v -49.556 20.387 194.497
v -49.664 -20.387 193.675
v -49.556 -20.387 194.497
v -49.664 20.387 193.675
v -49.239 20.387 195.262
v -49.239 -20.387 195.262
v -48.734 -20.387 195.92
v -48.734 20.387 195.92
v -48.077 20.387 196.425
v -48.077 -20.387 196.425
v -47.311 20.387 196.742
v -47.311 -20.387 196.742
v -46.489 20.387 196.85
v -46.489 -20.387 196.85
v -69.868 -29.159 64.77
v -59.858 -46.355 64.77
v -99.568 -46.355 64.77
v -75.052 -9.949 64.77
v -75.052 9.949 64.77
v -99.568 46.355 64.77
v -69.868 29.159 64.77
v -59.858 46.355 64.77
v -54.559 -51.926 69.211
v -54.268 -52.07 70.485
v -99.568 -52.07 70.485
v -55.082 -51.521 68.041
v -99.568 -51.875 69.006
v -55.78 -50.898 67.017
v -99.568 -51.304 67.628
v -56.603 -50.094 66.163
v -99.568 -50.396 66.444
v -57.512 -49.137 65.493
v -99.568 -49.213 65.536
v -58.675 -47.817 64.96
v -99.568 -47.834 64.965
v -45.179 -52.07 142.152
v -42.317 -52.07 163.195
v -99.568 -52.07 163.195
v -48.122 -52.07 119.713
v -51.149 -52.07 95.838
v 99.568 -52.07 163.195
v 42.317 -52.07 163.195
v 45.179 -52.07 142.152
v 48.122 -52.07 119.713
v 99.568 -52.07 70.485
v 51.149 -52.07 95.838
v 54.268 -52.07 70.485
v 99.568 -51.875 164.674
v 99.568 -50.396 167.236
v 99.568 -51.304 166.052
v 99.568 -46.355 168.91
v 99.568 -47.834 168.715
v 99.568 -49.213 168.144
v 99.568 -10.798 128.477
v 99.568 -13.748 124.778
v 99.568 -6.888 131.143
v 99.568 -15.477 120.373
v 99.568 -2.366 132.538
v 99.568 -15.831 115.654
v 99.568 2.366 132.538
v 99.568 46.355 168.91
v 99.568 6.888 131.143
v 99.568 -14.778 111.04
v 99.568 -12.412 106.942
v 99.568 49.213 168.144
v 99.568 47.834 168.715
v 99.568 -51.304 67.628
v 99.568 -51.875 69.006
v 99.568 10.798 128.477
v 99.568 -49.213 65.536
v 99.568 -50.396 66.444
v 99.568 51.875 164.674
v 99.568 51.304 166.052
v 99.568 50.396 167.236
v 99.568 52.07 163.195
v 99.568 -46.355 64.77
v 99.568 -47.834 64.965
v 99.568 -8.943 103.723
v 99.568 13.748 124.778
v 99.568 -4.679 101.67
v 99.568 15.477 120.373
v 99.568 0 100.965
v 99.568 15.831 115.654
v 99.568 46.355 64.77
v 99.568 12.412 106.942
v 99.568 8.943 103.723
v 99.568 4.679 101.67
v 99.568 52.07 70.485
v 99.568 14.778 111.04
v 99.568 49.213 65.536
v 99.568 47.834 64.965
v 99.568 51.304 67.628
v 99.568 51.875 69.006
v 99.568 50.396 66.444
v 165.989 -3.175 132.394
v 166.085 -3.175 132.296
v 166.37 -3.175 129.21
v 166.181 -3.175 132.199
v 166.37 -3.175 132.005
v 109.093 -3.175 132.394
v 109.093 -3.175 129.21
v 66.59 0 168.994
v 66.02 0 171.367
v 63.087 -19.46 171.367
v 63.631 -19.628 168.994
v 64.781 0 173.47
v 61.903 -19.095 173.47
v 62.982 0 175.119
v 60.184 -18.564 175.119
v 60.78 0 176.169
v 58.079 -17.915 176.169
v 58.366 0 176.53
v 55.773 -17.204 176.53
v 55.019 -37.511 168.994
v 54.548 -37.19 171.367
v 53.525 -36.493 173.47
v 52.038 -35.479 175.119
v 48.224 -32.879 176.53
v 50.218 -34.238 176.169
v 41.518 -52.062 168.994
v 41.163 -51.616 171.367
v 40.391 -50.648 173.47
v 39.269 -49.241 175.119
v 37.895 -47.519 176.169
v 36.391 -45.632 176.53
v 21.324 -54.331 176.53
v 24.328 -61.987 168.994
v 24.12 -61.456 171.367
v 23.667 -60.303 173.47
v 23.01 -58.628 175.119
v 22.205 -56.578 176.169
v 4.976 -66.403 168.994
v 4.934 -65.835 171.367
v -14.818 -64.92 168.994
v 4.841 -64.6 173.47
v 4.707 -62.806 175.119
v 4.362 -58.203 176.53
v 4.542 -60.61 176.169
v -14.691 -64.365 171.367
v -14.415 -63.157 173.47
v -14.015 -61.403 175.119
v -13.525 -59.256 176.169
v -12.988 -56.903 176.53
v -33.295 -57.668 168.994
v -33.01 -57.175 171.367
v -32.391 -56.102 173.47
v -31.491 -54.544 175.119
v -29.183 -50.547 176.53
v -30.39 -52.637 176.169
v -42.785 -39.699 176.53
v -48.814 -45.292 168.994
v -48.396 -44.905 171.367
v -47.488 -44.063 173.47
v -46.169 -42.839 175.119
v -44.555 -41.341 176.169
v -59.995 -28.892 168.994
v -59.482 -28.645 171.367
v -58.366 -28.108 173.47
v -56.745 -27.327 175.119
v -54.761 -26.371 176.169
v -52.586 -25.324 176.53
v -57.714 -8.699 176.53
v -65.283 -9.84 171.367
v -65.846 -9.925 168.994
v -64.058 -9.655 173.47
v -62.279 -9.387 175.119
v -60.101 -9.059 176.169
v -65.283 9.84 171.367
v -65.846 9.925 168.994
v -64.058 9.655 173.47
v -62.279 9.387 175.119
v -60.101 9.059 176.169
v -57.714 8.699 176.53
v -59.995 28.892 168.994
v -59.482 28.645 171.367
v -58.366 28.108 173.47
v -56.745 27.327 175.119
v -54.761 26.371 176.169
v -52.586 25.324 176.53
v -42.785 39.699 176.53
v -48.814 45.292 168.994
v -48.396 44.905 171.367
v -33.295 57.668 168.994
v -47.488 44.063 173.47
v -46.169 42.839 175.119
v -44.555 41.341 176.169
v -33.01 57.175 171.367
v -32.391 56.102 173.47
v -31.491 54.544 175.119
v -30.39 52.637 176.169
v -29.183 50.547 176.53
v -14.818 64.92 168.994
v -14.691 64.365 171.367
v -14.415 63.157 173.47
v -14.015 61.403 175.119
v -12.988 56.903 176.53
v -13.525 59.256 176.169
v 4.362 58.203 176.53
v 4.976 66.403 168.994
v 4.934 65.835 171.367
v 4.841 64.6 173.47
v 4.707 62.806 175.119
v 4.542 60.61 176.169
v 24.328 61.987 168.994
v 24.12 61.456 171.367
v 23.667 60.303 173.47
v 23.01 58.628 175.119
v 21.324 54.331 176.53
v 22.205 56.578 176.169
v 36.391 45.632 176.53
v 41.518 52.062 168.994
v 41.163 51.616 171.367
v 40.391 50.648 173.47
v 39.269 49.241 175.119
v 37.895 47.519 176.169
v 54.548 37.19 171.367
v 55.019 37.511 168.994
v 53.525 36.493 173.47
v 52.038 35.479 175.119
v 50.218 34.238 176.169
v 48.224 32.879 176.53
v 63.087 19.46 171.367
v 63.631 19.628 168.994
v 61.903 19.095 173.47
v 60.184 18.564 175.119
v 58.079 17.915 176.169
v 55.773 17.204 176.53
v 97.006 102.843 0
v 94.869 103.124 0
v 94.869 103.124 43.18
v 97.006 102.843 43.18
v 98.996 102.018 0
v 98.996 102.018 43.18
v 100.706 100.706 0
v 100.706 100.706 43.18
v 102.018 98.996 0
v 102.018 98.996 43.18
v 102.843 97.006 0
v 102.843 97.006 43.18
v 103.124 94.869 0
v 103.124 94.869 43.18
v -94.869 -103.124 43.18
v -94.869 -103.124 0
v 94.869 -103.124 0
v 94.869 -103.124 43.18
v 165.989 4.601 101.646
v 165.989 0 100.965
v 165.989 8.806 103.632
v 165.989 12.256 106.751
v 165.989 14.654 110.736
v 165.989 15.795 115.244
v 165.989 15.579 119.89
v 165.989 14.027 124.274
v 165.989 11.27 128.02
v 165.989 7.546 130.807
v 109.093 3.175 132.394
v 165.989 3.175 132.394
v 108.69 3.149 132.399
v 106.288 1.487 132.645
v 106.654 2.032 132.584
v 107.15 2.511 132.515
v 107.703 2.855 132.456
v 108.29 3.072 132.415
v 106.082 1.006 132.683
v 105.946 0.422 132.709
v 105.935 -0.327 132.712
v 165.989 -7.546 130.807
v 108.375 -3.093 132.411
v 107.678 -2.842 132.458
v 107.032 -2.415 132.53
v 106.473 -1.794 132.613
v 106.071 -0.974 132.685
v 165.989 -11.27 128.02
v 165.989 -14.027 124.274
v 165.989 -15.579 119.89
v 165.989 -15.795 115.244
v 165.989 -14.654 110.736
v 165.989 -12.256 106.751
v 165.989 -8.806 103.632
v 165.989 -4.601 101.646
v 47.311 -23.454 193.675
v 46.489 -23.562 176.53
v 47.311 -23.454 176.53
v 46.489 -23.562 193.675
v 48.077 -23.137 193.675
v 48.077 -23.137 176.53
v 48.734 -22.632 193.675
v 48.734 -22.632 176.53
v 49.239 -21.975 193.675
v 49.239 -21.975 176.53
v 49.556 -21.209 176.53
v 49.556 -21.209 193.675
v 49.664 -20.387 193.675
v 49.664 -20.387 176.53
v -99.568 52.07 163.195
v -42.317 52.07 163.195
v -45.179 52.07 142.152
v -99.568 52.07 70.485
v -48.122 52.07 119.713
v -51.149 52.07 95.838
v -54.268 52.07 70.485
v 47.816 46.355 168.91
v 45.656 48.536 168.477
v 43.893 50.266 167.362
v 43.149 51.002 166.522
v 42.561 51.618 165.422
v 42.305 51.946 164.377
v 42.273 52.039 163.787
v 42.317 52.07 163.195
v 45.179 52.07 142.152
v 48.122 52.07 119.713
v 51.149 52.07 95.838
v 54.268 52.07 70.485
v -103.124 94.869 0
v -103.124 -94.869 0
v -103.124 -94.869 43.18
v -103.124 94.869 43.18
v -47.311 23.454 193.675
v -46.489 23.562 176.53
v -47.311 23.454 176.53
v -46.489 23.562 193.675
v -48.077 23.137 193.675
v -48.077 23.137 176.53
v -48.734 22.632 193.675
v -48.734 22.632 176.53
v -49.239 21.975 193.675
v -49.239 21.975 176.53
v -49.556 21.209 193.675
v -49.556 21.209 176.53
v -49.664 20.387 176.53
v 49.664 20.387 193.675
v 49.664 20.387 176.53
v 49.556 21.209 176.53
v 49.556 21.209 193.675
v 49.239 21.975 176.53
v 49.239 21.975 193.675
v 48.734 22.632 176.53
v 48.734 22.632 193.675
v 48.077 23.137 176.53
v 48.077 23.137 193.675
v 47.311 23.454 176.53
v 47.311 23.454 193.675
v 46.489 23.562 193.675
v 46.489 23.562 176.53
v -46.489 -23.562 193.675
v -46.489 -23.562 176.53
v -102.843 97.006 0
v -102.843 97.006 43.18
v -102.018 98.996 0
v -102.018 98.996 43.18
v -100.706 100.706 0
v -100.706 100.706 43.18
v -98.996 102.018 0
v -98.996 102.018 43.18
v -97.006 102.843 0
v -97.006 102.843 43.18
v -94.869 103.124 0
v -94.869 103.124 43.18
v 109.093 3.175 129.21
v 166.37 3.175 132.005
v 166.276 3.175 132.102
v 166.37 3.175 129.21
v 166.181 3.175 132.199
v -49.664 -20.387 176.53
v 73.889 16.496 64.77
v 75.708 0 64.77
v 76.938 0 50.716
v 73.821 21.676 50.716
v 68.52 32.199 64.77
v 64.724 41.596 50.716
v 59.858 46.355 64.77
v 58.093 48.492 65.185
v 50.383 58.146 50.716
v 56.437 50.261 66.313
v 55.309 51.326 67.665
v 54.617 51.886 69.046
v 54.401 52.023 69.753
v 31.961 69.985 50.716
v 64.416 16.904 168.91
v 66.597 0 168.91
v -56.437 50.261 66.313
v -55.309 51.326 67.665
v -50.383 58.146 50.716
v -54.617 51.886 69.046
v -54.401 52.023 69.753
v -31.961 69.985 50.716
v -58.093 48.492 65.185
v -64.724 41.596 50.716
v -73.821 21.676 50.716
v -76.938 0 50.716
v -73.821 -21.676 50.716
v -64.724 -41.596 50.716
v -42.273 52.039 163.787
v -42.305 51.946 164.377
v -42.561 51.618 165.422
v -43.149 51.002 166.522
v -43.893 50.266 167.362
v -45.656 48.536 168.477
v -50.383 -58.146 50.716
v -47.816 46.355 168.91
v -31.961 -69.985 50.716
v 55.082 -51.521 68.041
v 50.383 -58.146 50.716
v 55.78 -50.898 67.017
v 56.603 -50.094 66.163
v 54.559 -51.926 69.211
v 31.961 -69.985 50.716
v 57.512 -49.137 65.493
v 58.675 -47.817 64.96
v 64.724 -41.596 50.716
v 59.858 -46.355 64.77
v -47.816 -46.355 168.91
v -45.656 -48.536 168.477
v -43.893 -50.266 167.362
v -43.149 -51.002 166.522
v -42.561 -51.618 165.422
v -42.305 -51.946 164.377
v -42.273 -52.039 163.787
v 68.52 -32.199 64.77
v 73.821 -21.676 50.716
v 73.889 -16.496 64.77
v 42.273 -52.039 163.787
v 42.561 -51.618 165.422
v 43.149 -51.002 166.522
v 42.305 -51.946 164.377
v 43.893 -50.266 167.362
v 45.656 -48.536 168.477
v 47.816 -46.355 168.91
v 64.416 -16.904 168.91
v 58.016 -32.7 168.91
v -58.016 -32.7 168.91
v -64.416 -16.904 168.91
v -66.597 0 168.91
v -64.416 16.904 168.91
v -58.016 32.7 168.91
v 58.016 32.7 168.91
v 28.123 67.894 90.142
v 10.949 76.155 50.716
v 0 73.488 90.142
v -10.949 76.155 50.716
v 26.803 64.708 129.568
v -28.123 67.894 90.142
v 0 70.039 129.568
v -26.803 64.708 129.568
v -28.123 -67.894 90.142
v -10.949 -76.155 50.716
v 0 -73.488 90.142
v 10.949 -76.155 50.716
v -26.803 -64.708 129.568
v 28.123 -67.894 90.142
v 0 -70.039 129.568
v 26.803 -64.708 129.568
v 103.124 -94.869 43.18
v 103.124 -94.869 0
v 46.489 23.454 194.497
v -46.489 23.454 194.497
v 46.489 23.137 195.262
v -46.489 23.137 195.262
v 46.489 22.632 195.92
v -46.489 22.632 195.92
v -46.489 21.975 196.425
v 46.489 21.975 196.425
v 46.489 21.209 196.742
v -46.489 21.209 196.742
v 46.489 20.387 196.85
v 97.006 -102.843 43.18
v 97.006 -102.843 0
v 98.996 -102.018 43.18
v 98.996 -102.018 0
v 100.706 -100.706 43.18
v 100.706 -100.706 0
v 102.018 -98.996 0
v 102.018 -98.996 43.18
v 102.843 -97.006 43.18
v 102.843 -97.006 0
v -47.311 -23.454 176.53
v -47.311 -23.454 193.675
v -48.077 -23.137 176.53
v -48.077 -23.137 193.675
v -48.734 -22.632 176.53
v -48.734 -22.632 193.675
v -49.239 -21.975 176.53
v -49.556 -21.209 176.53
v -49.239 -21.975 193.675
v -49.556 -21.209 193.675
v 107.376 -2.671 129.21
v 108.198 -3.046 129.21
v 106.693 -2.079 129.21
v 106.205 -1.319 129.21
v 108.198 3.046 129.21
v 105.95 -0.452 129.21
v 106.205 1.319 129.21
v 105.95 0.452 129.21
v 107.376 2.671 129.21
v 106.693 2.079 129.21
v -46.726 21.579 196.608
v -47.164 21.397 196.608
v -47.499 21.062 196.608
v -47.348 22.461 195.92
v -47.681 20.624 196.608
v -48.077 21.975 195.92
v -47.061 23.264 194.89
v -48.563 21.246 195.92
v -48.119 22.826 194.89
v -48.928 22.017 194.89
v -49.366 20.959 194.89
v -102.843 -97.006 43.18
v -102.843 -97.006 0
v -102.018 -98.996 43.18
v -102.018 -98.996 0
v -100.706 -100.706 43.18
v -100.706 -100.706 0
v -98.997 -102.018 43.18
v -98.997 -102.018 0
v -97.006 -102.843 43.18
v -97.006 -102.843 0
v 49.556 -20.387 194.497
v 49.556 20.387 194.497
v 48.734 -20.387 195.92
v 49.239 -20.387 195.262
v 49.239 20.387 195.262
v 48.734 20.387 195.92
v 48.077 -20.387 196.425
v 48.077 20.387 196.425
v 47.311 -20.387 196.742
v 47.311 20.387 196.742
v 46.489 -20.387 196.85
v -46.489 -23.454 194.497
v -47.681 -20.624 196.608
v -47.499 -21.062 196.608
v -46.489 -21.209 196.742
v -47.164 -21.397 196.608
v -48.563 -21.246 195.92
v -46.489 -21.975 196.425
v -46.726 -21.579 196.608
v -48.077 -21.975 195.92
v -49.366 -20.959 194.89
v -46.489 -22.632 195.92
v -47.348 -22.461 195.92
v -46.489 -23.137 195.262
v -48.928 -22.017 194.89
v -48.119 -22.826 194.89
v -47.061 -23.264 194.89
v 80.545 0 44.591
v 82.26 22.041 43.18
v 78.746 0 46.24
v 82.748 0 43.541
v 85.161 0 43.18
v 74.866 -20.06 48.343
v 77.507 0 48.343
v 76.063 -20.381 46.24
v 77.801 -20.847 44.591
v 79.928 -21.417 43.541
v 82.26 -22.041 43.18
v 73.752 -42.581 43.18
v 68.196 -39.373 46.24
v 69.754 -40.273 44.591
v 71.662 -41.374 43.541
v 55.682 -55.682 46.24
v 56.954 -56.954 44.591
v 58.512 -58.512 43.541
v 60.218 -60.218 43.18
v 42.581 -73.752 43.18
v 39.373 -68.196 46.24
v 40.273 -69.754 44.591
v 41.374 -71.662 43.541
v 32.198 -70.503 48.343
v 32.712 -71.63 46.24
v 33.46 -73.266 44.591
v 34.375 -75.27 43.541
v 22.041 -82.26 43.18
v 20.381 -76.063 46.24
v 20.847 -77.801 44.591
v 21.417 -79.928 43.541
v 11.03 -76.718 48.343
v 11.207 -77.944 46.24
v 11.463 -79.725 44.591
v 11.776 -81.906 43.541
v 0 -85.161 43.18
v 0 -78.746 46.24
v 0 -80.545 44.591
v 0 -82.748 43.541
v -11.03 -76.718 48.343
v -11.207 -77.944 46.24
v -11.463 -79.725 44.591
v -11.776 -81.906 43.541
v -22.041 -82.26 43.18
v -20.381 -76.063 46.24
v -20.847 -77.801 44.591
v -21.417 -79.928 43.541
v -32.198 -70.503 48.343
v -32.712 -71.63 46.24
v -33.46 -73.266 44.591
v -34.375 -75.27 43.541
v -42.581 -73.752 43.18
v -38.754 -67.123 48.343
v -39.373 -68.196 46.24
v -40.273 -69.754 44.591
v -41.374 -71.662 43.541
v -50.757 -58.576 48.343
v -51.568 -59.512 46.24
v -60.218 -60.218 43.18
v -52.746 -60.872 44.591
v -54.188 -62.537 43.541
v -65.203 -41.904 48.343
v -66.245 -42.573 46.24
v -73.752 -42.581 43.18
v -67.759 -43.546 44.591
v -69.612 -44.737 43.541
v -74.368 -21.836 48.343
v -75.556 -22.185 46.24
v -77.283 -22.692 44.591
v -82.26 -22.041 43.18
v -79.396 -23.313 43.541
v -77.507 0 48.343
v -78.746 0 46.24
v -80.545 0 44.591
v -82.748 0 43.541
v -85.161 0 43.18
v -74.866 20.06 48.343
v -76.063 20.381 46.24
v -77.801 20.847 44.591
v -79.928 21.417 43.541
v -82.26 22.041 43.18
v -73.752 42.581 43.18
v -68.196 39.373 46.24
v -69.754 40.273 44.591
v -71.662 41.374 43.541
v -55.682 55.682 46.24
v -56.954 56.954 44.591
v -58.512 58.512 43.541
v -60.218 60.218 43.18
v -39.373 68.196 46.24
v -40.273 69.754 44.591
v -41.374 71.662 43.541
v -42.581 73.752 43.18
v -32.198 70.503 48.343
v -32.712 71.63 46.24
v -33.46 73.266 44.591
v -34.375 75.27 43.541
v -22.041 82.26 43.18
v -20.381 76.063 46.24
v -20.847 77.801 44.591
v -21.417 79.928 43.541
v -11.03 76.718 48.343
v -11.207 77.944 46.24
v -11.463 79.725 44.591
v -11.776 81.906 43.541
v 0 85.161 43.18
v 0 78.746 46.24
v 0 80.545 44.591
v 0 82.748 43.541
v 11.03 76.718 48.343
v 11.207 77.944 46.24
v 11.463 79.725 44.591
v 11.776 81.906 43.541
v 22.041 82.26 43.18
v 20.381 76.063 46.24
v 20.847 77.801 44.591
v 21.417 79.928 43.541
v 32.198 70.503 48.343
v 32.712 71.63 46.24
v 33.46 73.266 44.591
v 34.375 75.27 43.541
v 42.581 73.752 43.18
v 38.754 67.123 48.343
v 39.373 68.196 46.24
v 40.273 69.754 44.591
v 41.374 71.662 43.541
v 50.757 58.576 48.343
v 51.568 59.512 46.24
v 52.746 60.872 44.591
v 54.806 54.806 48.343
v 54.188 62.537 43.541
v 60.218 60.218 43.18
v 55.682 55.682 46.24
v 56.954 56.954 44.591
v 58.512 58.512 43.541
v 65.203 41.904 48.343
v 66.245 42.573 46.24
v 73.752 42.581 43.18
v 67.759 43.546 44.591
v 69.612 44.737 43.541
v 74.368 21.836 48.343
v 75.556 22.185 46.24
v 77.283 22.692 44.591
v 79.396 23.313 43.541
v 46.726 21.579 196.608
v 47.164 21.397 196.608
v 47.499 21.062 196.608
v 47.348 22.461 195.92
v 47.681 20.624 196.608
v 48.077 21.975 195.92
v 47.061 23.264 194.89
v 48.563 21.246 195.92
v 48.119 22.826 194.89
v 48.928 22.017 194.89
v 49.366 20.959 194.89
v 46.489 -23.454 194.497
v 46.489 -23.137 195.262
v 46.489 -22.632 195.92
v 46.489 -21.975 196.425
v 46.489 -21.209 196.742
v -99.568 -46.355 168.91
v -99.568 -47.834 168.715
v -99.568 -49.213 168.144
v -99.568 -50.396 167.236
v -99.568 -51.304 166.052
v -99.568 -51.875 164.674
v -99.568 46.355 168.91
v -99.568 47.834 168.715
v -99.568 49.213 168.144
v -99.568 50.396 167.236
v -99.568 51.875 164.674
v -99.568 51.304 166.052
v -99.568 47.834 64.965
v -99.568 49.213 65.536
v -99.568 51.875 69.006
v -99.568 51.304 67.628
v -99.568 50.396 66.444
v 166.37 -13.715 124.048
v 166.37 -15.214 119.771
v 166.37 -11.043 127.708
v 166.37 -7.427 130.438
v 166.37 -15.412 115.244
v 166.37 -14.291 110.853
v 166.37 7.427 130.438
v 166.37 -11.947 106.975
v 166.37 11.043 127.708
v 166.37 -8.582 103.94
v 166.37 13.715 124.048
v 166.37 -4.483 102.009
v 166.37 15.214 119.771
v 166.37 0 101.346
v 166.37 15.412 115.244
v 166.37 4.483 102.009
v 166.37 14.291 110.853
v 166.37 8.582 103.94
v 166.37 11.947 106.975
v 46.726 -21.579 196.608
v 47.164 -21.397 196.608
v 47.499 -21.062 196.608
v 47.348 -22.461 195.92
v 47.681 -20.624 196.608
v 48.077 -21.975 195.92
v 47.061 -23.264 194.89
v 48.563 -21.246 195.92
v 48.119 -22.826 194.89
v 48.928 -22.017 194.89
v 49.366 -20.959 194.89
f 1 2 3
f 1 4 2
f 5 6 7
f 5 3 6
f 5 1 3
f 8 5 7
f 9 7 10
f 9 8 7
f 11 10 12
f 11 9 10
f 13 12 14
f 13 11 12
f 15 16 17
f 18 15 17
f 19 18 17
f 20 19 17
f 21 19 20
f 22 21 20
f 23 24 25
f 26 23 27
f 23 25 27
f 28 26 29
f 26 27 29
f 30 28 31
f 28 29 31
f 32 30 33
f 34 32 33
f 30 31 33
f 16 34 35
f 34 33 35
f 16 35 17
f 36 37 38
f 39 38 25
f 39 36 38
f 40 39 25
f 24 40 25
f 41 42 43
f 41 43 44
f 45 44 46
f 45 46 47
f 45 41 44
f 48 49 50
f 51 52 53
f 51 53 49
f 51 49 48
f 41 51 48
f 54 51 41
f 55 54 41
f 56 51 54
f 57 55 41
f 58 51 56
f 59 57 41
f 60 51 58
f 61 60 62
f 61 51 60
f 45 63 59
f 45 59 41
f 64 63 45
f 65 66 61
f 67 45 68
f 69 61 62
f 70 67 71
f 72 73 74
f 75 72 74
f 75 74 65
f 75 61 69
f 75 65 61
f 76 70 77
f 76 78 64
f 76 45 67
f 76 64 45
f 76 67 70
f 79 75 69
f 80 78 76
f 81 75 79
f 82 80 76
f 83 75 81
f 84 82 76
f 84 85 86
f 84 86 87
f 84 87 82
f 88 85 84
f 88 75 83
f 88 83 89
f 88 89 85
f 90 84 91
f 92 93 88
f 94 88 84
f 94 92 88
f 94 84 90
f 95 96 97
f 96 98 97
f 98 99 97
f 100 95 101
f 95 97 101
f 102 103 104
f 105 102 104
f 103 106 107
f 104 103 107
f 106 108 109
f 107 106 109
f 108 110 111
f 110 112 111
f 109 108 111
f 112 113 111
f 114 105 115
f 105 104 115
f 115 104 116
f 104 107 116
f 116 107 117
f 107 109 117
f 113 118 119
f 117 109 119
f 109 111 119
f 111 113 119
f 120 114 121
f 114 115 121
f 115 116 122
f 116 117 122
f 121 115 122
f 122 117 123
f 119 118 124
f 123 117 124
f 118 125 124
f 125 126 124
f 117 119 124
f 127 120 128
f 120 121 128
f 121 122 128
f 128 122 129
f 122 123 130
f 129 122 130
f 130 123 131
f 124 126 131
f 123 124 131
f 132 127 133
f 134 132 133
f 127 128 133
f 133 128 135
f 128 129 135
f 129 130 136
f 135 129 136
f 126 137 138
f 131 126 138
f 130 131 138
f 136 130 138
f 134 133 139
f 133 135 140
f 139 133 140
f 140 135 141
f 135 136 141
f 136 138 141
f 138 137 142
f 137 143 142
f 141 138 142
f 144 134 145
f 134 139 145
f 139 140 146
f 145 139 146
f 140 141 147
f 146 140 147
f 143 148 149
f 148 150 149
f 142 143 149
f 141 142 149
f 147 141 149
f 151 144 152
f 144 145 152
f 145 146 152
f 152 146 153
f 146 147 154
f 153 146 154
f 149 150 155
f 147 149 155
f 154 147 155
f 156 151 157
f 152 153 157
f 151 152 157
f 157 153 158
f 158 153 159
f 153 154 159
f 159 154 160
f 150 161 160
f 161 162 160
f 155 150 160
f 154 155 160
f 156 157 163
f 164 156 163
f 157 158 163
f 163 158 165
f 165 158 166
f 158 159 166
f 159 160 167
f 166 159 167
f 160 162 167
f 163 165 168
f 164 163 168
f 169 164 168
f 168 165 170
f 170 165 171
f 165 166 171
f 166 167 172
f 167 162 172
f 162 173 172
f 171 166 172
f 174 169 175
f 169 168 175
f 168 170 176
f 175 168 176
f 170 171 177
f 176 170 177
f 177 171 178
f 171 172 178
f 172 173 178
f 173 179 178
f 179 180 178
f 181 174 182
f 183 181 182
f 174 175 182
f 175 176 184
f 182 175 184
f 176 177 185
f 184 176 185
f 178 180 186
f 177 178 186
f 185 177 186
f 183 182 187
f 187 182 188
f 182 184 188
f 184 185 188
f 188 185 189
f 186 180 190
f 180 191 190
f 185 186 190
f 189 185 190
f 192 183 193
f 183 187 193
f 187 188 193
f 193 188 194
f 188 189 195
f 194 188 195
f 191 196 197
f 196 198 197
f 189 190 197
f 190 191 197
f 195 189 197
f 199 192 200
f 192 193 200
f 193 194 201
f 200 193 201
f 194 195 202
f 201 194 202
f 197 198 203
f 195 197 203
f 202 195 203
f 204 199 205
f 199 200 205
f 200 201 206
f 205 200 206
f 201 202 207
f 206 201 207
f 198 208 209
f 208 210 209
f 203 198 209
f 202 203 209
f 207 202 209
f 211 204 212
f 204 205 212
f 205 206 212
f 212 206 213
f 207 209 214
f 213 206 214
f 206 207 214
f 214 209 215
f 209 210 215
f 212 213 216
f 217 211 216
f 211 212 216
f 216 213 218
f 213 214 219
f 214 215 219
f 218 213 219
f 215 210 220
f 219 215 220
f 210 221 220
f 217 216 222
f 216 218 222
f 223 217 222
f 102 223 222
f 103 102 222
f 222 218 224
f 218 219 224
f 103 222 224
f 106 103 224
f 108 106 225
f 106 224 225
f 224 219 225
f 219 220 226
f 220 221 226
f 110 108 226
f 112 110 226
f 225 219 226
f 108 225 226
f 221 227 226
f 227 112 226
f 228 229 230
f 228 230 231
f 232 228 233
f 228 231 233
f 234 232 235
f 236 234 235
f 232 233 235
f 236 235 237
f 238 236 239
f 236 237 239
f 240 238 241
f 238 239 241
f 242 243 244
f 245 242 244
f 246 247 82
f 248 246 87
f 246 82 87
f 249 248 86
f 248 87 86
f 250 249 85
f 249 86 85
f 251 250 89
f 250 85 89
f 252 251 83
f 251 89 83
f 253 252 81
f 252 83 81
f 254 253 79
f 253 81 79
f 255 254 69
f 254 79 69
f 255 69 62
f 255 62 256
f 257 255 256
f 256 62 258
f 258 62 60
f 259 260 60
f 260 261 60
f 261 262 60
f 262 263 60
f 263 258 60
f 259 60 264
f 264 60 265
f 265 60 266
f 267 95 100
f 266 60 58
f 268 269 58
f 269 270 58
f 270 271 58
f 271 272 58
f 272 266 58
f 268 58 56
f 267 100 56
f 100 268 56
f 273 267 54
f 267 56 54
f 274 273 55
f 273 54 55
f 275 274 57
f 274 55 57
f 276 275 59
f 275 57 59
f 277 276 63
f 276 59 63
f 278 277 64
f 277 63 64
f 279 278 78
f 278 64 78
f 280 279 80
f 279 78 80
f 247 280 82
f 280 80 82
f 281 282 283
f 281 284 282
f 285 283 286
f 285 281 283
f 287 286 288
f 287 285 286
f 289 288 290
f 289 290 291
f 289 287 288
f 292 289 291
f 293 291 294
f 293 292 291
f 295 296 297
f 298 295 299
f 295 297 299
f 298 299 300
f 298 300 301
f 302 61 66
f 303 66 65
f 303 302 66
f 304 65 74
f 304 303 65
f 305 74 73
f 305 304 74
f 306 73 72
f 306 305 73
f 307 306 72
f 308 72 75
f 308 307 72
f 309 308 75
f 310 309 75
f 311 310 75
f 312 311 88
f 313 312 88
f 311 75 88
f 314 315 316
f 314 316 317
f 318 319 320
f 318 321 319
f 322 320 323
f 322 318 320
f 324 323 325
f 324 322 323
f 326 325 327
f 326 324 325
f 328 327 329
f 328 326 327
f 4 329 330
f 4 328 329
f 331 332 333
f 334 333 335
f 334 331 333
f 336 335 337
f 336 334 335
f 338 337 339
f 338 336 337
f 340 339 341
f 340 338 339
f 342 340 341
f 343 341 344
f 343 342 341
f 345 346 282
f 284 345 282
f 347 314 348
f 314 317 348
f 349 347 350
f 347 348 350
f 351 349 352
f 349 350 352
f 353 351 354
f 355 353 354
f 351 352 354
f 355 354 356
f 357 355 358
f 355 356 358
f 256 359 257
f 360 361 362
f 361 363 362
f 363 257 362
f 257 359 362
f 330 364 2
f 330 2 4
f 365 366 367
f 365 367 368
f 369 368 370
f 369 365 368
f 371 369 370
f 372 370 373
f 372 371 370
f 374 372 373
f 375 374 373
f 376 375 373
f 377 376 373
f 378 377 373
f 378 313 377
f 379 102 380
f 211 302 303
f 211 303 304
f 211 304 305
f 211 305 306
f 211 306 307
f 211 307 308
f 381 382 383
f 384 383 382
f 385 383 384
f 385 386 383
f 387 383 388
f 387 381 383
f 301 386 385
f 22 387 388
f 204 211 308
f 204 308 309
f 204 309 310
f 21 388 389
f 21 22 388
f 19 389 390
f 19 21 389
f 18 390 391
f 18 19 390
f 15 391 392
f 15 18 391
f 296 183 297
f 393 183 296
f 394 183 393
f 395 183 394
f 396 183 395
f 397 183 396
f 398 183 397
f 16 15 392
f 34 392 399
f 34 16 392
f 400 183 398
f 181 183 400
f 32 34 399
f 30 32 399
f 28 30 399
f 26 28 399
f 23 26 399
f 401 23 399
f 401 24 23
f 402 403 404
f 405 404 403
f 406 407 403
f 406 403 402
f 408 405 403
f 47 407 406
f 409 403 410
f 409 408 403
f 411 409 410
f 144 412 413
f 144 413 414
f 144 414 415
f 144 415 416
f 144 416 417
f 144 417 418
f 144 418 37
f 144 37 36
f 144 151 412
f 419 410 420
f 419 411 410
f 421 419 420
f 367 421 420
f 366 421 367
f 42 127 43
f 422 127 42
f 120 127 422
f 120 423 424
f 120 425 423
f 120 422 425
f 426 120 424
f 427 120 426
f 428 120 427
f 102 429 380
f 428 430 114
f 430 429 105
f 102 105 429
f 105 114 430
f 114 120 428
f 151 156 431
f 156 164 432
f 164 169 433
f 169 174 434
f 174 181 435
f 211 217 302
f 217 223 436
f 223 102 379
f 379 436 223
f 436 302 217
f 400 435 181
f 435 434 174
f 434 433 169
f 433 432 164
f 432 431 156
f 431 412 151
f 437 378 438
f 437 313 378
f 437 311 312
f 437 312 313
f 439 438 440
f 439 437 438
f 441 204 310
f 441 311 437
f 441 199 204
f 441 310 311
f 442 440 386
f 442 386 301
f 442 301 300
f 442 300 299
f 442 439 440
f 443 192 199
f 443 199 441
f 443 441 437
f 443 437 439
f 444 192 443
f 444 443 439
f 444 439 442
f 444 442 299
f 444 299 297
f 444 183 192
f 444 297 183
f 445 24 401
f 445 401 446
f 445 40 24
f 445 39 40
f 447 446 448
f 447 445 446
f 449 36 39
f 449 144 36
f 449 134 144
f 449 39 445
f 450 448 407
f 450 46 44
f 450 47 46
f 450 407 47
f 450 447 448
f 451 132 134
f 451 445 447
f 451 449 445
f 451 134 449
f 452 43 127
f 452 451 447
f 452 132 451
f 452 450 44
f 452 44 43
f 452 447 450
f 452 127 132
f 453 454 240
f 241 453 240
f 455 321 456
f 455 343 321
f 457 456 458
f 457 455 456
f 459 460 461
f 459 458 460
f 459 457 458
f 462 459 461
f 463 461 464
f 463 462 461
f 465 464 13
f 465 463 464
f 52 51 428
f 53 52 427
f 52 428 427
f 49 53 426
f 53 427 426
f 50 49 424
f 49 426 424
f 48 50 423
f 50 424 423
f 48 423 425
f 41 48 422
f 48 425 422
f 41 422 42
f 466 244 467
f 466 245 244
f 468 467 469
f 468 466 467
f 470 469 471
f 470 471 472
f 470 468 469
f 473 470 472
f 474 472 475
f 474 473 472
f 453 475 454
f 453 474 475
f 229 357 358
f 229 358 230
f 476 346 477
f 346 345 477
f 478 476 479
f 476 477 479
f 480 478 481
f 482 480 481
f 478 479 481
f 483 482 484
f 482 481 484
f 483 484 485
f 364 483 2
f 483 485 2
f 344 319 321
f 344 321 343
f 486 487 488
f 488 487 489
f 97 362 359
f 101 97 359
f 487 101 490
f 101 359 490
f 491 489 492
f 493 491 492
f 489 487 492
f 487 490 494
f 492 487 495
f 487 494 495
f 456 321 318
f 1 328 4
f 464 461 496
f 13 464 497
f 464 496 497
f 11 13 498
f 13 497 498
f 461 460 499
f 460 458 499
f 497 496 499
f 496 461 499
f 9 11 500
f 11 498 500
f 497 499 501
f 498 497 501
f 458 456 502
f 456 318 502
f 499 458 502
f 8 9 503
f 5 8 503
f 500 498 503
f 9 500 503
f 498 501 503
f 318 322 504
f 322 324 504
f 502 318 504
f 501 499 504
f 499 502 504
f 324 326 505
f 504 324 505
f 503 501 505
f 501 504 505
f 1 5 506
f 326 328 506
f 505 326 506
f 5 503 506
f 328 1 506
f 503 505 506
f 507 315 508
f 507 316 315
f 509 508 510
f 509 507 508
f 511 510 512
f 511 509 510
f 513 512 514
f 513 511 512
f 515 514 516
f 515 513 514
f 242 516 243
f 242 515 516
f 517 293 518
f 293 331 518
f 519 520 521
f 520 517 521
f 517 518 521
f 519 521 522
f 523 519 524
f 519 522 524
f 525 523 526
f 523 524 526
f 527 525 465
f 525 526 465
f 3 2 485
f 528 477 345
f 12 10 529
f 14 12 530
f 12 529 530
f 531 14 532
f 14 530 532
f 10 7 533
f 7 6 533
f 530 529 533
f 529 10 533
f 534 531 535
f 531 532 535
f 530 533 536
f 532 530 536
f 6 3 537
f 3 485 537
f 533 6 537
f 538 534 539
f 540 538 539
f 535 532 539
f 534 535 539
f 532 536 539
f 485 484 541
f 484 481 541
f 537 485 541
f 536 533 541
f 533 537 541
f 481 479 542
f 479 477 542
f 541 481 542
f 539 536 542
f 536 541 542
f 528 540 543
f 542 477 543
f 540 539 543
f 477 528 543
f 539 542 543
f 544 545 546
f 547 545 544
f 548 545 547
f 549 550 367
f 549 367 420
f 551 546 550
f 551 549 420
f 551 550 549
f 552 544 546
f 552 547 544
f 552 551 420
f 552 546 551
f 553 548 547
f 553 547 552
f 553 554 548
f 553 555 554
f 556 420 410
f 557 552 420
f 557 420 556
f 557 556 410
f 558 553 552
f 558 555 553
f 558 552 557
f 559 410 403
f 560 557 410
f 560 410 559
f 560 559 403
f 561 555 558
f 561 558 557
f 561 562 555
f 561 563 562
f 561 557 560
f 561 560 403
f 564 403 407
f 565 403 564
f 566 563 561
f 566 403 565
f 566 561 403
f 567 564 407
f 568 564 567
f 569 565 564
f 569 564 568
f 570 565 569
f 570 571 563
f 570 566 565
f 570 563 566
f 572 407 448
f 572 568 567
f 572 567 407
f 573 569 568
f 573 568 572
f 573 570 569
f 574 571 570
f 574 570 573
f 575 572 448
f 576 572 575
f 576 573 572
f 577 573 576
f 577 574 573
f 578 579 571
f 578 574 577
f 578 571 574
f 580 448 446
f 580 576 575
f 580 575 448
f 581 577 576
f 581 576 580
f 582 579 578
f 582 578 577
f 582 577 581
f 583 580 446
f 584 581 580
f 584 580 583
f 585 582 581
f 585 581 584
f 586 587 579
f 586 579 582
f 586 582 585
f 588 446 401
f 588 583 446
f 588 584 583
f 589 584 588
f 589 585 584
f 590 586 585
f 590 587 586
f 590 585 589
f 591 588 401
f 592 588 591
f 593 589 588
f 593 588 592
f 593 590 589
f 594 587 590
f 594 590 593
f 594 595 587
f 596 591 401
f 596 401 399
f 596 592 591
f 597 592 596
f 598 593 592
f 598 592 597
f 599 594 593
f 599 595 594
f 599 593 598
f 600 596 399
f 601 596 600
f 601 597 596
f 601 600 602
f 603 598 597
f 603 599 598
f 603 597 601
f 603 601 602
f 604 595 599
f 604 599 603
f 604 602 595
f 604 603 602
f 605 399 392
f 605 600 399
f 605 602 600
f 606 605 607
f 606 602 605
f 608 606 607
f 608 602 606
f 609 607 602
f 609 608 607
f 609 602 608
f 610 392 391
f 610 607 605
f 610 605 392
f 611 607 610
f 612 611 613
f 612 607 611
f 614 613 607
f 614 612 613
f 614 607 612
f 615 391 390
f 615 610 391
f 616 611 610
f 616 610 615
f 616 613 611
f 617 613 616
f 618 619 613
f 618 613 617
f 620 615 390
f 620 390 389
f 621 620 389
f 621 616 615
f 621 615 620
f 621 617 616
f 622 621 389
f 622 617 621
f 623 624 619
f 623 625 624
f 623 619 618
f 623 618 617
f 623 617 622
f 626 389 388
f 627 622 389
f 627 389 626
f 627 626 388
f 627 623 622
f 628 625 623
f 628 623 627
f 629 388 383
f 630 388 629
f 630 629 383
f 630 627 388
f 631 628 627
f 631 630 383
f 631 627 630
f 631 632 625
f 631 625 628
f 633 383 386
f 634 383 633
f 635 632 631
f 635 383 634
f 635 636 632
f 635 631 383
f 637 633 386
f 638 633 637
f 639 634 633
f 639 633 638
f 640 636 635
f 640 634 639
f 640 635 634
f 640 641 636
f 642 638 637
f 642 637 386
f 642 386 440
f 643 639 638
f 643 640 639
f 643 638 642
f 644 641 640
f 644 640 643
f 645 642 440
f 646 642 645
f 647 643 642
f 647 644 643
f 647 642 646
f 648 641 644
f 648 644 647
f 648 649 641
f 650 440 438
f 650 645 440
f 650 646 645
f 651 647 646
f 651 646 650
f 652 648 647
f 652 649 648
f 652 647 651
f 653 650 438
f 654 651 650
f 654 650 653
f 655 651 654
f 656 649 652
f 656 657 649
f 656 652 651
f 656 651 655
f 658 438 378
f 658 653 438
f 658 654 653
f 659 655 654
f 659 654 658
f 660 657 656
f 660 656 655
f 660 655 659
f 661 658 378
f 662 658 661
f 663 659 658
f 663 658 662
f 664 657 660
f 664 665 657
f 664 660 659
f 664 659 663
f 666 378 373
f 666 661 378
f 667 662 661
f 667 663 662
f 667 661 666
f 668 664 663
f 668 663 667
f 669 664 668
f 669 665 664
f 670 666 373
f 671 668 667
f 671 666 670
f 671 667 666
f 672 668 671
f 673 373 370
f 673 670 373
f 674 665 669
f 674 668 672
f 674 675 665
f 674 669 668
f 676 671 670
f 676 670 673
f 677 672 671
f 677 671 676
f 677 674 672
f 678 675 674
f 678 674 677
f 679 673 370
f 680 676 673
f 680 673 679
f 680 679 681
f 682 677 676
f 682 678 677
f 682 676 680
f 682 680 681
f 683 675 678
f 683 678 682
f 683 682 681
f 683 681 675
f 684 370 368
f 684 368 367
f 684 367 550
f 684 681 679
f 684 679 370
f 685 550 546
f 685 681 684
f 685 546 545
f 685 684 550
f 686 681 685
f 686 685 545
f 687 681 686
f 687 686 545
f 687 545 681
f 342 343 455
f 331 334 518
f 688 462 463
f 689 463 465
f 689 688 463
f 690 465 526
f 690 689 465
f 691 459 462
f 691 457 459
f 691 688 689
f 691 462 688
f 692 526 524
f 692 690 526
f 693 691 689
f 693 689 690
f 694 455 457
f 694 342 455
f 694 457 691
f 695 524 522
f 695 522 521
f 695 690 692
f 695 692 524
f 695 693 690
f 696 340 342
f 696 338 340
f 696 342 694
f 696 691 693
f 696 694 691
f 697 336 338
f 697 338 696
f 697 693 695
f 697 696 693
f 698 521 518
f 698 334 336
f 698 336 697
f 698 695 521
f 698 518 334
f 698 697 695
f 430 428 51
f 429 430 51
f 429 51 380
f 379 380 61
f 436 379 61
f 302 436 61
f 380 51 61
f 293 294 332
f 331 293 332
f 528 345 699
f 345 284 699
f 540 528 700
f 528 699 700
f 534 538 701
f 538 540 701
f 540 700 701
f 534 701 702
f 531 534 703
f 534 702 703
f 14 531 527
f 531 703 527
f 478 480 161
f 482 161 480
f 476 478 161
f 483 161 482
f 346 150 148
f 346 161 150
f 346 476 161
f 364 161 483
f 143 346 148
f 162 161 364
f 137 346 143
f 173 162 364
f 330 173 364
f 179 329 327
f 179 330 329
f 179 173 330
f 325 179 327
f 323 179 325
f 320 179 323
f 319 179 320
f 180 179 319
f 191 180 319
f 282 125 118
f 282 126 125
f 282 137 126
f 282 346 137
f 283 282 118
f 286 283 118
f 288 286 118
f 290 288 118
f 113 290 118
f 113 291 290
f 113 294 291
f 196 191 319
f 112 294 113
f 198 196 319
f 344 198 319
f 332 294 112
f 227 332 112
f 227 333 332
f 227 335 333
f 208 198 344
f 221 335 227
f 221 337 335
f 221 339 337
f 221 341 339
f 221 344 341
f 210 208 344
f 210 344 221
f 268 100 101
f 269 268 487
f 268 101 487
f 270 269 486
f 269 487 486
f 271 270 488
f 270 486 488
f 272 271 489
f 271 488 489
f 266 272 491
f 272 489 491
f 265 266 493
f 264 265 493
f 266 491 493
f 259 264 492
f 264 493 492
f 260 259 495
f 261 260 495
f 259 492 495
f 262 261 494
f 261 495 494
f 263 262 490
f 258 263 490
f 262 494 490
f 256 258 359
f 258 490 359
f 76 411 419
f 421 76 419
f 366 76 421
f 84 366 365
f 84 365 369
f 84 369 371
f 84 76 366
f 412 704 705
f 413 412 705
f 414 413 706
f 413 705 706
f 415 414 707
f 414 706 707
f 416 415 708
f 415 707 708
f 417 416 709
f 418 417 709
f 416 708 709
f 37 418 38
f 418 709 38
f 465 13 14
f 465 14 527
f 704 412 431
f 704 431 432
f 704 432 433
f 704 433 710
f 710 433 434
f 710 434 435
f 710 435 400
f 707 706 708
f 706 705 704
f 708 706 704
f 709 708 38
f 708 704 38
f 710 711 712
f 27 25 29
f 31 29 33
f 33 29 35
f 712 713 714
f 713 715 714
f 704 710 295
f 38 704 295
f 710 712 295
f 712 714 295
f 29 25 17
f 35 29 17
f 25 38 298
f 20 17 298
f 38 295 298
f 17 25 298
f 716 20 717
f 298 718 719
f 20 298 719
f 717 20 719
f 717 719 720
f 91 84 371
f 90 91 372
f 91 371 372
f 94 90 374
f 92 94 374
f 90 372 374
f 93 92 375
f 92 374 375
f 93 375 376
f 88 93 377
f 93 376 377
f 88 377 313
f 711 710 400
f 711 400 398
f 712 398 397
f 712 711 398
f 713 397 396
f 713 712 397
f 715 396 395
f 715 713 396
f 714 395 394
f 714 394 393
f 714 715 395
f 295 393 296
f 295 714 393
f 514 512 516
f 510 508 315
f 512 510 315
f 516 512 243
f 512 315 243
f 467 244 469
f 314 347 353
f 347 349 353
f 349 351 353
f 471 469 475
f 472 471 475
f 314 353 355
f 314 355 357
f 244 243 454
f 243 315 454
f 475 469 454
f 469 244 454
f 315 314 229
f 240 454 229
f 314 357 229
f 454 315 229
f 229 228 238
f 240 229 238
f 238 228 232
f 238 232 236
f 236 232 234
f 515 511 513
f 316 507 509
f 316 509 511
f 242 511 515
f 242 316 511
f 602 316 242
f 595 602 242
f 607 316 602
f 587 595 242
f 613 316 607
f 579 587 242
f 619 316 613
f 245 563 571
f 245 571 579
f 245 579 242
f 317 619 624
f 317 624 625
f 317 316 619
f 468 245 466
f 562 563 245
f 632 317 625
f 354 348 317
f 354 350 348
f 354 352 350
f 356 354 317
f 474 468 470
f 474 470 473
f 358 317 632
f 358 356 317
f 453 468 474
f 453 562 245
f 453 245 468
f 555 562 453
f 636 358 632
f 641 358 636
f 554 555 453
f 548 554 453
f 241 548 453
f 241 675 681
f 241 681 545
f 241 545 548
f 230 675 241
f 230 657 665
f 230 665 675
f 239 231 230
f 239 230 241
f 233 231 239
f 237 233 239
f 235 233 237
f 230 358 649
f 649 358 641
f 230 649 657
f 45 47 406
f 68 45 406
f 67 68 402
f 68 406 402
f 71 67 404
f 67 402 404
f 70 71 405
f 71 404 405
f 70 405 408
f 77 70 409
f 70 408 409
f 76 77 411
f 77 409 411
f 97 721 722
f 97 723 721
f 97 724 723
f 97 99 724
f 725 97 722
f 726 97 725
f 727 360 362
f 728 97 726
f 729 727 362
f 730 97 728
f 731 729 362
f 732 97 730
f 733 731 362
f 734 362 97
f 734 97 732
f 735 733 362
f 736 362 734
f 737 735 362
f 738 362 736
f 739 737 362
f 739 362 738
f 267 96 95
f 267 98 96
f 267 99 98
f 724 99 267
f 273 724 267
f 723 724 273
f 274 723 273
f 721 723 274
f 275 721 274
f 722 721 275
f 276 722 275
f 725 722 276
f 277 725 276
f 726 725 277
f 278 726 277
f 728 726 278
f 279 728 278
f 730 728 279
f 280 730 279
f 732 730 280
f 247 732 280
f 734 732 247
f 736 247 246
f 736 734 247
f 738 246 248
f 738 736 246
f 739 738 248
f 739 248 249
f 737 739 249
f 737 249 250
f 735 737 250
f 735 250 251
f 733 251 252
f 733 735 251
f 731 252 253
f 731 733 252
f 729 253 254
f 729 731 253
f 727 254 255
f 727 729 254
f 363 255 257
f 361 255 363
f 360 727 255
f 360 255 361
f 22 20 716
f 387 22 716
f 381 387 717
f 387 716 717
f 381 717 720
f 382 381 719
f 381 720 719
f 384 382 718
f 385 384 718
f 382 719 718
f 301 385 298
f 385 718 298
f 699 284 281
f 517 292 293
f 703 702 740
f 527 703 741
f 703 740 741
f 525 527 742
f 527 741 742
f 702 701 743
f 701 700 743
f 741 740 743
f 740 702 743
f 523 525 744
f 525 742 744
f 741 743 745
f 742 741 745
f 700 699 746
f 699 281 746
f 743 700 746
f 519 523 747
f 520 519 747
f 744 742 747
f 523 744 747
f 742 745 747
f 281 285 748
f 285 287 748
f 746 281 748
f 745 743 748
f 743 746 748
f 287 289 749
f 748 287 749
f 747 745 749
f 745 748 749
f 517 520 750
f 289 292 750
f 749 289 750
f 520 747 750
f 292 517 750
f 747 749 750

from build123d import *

# Parameters (mm, degrees)
SKETCH1_W           = 206.248
SKETCH1_H           = 206.248
C_DIM_DEPTH         = 43.18
SHAFT_START         = 12.7
SKETCH_A_R          = 15.875
SHAFT_DEPTH         = 153.67
SKETCH3_W           = 104.14
SKETCH3_H           = 104.14
BOSS_EXTRUDE3_DEPTH = 99.568
FILLET1_R           = 5.715
FILLET4_R           = 5.715
SKETCH4_R           = 77.597
BOSS_EXTRUDE4_DEPTH = 133.35
BOSS_EXTRUDE4_TAPER = 5
FILLET2_R           = 8.255
SKETCH5_W           = 99.328405226
SKETCH5_H           = 47.124202614
BOSS_EXTRUDE5_DEPTH = 20.32
CHAMFER1_SIZE       = 0.381
FILLET3_R           = 3.175
CUT_EXTRUDE_START   = 12.3698
CUT_EXTRUDE_B_DEPTH = 68.6402


with BuildPart() as part:
    # Sketch1 → C dim (new body)
    with BuildSketch(Plane.XY):
        Rectangle(SKETCH1_W, SKETCH1_H)
    extrude(amount=C_DIM_DEPTH)



with BuildPart() as body_2:
    # Sketch A → Shaft (new body)
    with BuildSketch(Plane(origin=(0, 0, 0), x_dir=(0, 0, -1), z_dir=(1, 0, 0)).offset(SHAFT_START)):
        with Locations((-116.84, 0)):
            Circle(SKETCH_A_R)
    extrude(amount=SHAFT_DEPTH)

    # Chamfer1
    chamfer1_edges = [body_2.edges().sort_by_distance(p)[0] for p in [
        (166.37, 0, 132.715),
    ]]
    chamfer(chamfer1_edges, length=CHAMFER1_SIZE)

    # Sketch6 → Cut-Extrude B (cut, through all)
    with BuildSketch(Plane.XY.offset(116.84).offset(CUT_EXTRUDE_START)):
        with BuildLine():
            Line((166.37, -3.175), (109.093, -3.175))
            ThreePointArc((109.093, -3.175), (105.918, 0), (109.093, 3.175))
            Line((109.093, 3.175), (166.37, 3.175))
            ThreePointArc((166.37, 3.175), (169.545, 0), (166.37, -3.175))
        make_face()
    extrude(amount=CUT_EXTRUDE_B_DEPTH, mode=Mode.SUBTRACT)


with BuildPart() as body_3:
    # Sketch3 → Boss-Extrude3 (new body)
    with BuildSketch(Plane(origin=(0, 0, 0), x_dir=(0, 0, -1), z_dir=(1, 0, 0))):
        with Locations((-116.84, 0)):
            Rectangle(SKETCH3_W, SKETCH3_H)
    extrude(amount=BOSS_EXTRUDE3_DEPTH)


with BuildPart() as body_4:
    # Mirror2: mirrored copy
    add(body_3.part.mirror(Plane(origin=(0, 0, 0), x_dir=(0, 0, 1), z_dir=(1, 0, 0))))

    # Fillet4
    fillet4_edges = [body_4.edges().sort_by_distance(p)[0] for p in [
        (-49.784, 52.07, 64.77),
        (-49.784, 52.07, 168.91),
        (-49.784, -52.07, 168.91),
        (-49.784, -52.07, 64.77),
    ]]
    fillet(fillet4_edges, radius=FILLET4_R)


with BuildPart() as body_3_1:
    add(body_3.part)

    # Fillet1
    fillet1_edges = [body_3_1.edges().sort_by_distance(p)[0] for p in [
        (49.784, 52.07, 64.77),
        (49.784, 52.07, 168.91),
        (49.784, -52.07, 168.91),
        (49.784, -52.07, 64.77),
    ]]
    fillet(fillet1_edges, radius=FILLET1_R)


with BuildPart() as part_1:
    add(part.part)

    add(body_3_1.part)  # Boss-Extrude4 merges body 3

    add(body_4.part)  # Boss-Extrude4 merges body 4
    # Sketch4 → Boss-Extrude4 (add)
    with BuildSketch(Plane.XY.offset(43.18)):
        Circle(SKETCH4_R)
    extrude(amount=BOSS_EXTRUDE4_DEPTH, taper=BOSS_EXTRUDE4_TAPER)

    # Fillet2
    fillet2_edges = [part_1.edges().sort_by_distance(p)[0] for p in [
        (-65.930386719, 0, 176.53),
        (-77.597, 0, 43.18),
        (-103.124, 103.124, 21.59),
        (103.124, 103.124, 21.59),
        (103.124, -103.124, 21.59),
        (-103.124, -103.124, 21.59),
    ]]
    fillet(fillet2_edges, radius=FILLET2_R)

    # Sketch5 → Boss-Extrude5 (add)
    with BuildSketch(Plane.XY.offset(176.53)):
        Rectangle(SKETCH5_W, SKETCH5_H)
    extrude(amount=BOSS_EXTRUDE5_DEPTH)

    # Fillet3
    fillet3_edges = [part_1.edges().sort_by_distance(p)[0] for p in [
        (-49.664202613, 23.562101307, 186.69),
        (-49.664202613, -23.562101307, 186.69),
        (49.664202613, -23.562101307, 186.69),
        (49.664202613, 23.562101307, 186.69),
        (0, 23.562101307, 196.85),
        (-49.664202613, 0, 196.85),
        (0, -23.562101307, 196.85),
        (49.664202613, 0, 196.85),
    ]]
    fillet(fillet3_edges, radius=FILLET3_R)

    # Combine1: union body 2
    add(body_2.part)


solid = part_1.part
